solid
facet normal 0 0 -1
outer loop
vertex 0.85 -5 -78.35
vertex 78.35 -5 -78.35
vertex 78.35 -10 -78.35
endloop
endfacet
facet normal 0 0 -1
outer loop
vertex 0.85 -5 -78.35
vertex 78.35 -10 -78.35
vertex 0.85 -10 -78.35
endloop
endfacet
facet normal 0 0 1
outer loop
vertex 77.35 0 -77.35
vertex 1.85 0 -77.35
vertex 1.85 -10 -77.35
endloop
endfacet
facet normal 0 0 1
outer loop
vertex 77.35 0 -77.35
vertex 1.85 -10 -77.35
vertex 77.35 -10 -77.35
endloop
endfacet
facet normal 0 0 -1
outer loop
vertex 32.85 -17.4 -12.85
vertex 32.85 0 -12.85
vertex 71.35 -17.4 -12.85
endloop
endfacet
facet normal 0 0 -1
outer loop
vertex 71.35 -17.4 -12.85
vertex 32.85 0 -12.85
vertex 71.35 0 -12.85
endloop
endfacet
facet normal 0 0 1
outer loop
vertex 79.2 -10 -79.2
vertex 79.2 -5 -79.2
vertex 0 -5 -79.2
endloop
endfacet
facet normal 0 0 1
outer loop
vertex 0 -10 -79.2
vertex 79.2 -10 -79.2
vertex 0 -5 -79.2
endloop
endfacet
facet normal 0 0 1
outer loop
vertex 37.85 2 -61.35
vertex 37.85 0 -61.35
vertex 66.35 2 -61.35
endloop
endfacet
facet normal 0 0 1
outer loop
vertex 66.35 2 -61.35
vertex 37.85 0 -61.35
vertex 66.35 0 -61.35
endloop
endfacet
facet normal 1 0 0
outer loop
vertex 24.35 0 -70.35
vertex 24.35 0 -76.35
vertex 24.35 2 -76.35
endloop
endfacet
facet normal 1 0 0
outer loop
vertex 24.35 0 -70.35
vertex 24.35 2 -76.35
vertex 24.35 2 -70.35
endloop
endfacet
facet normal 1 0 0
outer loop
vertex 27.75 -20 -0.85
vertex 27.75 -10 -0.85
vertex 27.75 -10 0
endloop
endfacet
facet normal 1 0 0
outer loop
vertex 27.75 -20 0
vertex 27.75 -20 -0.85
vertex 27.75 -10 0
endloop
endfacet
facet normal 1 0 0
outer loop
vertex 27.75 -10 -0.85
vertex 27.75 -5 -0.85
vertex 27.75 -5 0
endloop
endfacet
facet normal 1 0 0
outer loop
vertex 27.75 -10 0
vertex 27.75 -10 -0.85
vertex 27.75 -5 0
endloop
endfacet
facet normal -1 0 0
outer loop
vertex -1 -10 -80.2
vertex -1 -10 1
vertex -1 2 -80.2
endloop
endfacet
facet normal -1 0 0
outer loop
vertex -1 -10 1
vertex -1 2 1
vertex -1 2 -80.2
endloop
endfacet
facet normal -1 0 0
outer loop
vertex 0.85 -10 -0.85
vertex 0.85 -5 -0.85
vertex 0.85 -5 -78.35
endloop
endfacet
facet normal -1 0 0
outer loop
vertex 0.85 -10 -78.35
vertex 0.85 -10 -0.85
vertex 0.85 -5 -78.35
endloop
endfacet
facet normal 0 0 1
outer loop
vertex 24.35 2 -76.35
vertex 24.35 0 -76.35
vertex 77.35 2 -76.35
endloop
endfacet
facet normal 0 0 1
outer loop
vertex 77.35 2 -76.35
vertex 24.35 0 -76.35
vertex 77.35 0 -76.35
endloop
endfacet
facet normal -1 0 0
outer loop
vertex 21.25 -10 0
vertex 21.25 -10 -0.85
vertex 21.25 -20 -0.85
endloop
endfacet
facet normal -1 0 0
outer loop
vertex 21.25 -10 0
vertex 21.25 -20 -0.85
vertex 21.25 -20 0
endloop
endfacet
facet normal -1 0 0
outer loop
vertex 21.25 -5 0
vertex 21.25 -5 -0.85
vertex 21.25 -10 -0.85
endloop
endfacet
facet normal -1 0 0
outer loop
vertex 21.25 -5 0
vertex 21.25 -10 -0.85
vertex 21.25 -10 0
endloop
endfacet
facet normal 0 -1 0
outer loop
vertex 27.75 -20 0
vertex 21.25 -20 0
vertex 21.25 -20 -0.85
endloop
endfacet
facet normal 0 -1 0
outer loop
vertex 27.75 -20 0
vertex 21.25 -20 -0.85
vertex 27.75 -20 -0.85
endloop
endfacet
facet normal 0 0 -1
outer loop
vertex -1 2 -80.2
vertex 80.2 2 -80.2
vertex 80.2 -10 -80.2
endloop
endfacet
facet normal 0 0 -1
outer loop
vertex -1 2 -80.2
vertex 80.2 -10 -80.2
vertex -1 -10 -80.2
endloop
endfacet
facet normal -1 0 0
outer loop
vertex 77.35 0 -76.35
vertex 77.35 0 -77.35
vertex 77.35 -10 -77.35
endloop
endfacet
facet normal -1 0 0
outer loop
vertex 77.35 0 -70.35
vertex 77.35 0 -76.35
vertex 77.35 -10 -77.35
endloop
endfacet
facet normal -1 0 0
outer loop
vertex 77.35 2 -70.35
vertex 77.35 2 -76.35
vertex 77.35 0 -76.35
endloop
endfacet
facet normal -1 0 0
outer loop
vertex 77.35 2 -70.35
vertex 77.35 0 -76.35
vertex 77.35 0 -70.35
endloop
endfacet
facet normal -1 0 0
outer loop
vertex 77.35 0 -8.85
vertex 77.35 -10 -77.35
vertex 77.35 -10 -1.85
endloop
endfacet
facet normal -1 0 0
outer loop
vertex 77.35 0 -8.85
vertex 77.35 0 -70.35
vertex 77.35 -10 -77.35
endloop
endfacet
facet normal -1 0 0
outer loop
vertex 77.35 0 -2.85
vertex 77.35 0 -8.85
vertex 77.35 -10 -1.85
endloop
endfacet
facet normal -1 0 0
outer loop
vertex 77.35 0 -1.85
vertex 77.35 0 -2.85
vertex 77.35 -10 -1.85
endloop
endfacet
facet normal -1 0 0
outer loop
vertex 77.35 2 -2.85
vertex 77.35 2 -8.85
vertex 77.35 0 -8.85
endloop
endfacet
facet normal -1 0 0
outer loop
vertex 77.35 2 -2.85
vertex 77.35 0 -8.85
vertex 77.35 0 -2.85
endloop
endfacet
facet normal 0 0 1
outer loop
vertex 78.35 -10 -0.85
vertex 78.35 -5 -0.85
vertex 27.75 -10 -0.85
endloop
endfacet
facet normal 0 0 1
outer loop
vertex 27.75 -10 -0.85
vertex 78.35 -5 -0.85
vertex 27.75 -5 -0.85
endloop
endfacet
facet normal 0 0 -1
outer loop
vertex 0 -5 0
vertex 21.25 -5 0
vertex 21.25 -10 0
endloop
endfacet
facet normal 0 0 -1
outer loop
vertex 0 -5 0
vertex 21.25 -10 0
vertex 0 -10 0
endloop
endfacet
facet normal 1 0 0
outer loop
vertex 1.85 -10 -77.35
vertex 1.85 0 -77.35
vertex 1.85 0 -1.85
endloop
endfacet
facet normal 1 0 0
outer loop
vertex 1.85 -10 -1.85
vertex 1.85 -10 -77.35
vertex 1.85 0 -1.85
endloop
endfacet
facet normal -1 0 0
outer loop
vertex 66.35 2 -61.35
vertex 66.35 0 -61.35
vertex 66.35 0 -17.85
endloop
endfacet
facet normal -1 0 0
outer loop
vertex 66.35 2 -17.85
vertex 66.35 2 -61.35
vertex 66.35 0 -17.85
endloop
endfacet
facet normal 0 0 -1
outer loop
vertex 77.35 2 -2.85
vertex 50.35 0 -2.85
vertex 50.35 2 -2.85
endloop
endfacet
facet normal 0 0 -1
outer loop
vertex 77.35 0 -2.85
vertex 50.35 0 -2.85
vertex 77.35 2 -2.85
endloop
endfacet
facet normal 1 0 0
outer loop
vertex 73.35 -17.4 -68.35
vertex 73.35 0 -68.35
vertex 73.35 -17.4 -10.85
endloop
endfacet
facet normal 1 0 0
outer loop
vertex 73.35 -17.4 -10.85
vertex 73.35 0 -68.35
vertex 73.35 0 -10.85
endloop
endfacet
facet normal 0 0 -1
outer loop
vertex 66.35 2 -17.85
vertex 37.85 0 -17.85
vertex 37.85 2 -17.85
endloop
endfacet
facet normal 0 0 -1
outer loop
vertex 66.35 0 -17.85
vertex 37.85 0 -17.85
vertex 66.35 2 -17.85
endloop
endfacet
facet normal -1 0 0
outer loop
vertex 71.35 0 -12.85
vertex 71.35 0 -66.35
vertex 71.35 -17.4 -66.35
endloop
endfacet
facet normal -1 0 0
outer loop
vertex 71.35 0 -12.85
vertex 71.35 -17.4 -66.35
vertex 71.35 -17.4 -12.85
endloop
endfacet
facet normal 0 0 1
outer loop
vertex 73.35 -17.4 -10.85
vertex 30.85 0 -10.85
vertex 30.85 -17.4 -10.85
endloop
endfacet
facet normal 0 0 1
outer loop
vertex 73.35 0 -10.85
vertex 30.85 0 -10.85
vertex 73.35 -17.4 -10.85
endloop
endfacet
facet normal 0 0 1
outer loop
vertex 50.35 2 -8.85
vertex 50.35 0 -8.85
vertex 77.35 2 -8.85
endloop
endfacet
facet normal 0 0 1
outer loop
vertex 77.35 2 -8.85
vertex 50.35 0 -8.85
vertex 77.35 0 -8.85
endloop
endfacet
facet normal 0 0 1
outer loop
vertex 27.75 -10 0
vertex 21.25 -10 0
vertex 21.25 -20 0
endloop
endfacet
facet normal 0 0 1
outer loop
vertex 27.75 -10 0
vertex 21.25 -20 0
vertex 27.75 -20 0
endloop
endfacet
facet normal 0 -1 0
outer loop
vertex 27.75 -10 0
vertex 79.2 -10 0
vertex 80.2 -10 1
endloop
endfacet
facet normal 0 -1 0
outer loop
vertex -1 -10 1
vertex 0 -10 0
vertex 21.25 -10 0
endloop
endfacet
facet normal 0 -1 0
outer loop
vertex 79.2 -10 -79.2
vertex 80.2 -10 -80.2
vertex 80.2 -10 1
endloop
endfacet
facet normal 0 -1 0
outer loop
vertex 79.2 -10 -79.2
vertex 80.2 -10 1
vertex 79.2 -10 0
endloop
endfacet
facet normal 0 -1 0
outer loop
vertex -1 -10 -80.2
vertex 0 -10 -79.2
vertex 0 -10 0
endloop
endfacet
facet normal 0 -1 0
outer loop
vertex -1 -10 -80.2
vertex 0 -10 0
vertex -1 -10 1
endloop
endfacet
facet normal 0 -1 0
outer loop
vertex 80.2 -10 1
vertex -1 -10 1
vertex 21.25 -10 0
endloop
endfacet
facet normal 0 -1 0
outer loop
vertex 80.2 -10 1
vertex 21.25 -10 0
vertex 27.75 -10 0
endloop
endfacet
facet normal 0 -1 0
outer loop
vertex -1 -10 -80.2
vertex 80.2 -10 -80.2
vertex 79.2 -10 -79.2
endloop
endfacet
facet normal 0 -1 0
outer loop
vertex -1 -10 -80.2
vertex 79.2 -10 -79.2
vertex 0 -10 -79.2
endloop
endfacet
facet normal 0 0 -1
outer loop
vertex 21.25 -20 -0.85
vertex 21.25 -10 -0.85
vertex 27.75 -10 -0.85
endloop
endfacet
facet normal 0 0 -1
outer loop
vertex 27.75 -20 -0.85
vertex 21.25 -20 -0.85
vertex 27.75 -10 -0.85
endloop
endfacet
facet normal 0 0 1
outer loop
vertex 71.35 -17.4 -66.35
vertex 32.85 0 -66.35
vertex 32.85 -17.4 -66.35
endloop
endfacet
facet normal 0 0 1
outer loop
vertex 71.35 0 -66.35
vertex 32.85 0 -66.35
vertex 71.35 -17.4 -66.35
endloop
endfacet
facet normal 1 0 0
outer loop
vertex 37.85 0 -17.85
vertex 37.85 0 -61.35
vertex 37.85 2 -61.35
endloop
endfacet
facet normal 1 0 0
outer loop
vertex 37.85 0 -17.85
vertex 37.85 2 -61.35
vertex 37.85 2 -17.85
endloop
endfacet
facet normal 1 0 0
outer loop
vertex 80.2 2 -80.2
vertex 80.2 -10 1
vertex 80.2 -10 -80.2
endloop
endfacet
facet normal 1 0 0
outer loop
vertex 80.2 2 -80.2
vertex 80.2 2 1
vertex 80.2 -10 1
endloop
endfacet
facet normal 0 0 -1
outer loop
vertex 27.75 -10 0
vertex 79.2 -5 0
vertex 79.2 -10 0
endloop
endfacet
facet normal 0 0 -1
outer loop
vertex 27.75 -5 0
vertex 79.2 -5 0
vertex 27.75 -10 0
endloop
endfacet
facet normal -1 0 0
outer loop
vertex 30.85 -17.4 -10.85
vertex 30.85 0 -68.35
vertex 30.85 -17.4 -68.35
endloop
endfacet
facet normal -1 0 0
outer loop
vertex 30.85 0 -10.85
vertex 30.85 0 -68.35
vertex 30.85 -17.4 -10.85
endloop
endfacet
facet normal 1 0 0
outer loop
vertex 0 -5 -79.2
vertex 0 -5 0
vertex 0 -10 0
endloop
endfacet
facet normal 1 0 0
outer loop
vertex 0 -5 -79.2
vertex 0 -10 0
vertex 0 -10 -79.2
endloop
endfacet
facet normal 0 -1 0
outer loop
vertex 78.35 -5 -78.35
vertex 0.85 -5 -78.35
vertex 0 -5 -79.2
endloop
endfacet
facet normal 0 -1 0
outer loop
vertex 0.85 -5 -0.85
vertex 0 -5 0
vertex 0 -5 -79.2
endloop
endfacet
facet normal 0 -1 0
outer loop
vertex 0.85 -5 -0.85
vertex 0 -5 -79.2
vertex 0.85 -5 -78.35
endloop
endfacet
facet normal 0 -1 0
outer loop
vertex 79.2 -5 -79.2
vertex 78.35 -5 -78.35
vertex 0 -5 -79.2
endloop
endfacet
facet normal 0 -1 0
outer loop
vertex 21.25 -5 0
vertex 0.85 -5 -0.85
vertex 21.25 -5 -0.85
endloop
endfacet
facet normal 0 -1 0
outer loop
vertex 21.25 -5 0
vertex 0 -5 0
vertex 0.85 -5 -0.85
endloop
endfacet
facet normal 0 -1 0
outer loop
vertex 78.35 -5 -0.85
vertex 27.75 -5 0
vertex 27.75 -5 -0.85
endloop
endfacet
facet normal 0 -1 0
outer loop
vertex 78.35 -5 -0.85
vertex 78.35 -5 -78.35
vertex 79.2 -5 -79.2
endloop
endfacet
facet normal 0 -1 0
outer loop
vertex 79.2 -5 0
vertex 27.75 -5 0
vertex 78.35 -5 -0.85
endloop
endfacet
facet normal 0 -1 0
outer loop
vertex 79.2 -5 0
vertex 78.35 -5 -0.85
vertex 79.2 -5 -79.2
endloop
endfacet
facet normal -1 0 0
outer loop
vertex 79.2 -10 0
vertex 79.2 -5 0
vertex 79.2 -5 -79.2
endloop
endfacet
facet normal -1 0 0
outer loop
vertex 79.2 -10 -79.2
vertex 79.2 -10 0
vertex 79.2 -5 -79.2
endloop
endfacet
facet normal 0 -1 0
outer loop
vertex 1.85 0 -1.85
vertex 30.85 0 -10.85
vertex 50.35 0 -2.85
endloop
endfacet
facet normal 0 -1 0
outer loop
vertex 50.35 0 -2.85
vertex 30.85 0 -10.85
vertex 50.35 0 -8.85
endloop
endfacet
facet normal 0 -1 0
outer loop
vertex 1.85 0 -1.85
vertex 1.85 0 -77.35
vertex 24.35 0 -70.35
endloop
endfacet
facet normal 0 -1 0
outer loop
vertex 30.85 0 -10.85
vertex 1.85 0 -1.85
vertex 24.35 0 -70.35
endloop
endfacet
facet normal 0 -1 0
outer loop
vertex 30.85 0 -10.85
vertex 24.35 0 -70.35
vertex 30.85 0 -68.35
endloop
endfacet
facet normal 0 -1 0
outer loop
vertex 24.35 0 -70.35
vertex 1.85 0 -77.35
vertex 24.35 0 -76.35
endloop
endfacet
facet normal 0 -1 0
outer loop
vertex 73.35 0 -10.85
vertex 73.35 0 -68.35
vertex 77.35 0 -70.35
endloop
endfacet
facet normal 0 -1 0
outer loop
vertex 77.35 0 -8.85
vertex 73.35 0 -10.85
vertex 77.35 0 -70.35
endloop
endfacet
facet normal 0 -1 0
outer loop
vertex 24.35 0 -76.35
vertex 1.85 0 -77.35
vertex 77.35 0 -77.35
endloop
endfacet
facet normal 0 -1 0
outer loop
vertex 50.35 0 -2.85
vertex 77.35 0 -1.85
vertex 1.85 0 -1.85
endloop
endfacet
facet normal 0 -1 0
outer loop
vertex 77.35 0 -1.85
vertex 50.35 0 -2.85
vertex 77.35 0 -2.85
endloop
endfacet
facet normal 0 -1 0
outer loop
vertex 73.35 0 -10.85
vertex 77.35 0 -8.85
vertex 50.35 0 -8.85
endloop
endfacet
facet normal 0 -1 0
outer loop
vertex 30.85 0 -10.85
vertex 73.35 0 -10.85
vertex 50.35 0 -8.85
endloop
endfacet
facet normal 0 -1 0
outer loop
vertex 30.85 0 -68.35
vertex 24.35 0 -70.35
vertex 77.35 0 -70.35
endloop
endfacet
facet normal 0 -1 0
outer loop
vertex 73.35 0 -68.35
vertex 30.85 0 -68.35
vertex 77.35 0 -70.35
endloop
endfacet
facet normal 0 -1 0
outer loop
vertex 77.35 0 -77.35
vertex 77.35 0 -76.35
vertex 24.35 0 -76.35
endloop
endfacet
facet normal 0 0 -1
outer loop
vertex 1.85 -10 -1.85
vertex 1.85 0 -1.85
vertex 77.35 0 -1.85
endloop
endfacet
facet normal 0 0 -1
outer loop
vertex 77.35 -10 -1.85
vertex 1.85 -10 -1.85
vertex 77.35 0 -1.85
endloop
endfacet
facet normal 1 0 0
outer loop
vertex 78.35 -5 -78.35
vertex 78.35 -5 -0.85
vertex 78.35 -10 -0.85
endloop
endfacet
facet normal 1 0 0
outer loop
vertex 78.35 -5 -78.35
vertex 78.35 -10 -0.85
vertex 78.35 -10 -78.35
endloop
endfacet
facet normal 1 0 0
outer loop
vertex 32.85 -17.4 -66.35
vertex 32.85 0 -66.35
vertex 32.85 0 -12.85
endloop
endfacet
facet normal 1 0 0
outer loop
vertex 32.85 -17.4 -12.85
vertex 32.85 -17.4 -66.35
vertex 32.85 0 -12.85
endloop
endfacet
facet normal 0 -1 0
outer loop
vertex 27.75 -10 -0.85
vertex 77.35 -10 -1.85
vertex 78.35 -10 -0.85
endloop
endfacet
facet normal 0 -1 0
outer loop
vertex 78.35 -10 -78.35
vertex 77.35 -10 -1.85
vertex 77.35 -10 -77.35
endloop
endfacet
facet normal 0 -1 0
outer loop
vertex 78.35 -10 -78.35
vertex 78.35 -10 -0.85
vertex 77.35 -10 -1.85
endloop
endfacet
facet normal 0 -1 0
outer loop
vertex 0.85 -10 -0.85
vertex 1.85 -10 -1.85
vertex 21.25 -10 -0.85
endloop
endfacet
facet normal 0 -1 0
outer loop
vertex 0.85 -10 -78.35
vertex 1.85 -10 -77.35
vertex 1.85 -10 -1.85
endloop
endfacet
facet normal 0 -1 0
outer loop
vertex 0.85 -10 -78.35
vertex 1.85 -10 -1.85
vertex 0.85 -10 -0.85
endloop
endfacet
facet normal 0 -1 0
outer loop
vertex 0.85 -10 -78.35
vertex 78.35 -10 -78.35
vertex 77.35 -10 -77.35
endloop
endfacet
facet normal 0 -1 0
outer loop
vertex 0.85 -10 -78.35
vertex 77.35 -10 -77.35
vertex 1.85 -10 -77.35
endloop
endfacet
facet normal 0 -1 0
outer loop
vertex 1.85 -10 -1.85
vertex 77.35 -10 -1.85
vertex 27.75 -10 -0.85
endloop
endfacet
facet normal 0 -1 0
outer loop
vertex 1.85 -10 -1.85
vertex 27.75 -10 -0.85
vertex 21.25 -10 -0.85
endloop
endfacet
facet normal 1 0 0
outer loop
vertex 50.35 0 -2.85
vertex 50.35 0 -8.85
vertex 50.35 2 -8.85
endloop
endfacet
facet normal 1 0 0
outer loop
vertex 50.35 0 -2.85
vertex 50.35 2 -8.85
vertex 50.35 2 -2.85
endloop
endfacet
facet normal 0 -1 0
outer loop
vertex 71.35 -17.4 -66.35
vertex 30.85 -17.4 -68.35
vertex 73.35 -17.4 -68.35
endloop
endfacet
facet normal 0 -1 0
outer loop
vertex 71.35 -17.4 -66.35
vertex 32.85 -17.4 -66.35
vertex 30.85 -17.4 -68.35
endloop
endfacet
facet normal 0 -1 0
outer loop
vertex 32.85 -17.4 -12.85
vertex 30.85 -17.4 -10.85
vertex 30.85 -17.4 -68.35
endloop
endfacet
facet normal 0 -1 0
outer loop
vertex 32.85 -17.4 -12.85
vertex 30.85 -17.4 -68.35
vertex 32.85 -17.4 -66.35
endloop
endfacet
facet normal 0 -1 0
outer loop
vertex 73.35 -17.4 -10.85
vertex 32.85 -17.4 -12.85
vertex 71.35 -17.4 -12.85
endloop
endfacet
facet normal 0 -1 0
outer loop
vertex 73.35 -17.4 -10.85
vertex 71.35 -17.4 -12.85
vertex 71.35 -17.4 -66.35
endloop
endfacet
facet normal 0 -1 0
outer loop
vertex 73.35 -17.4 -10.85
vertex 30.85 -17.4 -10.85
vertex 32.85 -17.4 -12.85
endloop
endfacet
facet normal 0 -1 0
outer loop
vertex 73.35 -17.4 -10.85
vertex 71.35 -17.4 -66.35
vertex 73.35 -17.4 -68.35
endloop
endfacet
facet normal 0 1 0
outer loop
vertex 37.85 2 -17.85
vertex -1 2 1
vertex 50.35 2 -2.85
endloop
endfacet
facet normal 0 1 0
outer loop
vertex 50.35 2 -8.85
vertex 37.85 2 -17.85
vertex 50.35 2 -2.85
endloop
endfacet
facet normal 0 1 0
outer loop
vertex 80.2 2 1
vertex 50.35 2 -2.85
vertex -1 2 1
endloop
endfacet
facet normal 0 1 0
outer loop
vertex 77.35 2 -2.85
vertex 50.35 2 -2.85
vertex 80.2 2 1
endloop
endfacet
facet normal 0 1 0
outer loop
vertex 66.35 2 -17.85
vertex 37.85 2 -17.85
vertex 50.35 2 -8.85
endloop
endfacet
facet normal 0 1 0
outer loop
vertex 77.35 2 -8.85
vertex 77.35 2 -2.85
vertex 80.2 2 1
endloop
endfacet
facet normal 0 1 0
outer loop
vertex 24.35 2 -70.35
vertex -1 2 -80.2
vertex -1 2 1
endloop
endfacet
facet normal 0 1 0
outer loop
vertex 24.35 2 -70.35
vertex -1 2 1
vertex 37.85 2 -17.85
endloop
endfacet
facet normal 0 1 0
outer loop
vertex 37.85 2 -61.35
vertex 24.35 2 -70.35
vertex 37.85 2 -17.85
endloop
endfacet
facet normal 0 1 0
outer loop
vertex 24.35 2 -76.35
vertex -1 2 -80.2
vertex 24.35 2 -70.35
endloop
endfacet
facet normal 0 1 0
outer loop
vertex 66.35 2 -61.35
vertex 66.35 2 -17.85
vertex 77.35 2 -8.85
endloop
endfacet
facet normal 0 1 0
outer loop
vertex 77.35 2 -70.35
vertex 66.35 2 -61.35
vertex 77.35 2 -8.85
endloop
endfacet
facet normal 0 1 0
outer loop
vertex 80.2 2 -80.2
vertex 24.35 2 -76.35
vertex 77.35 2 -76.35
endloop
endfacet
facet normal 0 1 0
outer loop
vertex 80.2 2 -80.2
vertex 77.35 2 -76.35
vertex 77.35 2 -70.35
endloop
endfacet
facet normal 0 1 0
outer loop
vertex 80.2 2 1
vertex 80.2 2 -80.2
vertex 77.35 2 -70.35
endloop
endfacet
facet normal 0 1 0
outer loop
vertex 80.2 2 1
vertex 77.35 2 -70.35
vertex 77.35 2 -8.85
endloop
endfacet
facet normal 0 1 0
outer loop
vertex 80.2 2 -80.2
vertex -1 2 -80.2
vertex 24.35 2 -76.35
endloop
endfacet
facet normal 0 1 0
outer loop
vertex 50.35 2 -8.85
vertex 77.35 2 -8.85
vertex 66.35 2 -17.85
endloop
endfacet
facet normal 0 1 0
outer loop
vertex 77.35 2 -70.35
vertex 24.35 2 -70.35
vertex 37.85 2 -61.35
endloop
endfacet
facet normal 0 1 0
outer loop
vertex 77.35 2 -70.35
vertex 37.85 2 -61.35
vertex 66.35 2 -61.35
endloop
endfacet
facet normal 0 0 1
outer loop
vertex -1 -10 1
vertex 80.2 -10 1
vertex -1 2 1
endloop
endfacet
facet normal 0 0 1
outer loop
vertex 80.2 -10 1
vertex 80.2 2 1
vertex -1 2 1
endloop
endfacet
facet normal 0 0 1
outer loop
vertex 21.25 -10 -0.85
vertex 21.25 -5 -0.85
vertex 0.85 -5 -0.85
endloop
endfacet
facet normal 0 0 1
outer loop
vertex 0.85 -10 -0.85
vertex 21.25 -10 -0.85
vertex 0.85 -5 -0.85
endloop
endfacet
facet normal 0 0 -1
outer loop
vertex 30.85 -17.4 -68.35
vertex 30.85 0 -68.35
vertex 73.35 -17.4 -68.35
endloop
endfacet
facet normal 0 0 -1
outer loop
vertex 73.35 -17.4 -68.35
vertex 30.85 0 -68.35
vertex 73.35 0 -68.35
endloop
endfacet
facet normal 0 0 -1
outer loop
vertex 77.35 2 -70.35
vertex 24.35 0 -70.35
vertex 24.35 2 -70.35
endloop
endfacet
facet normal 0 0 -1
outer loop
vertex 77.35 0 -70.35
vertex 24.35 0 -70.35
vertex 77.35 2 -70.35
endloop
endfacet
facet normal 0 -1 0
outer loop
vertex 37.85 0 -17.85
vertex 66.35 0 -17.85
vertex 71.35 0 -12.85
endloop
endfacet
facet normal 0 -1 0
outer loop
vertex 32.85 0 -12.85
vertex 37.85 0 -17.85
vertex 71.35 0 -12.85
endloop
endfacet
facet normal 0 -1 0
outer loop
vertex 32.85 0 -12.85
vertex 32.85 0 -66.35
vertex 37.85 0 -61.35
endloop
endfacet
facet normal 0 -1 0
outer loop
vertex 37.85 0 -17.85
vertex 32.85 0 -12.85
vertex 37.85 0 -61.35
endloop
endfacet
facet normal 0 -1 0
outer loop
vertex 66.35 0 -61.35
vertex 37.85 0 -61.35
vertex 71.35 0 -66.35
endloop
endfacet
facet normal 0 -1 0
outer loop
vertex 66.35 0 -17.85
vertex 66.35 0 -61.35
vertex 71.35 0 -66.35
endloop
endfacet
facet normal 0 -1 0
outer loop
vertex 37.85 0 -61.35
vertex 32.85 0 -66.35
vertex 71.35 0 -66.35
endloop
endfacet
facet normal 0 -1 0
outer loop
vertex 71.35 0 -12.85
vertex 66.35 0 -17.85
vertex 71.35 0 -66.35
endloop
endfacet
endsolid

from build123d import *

# Parameters (mm, degrees)
SKETCH5_W                 = 81.2
SKETCH5_H                 = 81.2
BOSS_EXTRUDE3_DEPTH       = 2
SKETCH9_W                 = 81.2
SKETCH9_H                 = 81.2
SKETCH9_W_2               = 75.5
SKETCH9_H_2               = 75.5
BOSS_EXTRUDE5_DEPTH       = 5
SKETCH6_W                 = 42.5
SKETCH6_H                 = 57.5
SKETCH6_W_2               = 38.5
SKETCH6_H_2               = 53.5
BOSS_EXTRUDE4_DEPTH       = 17.4
SKETCH7_W                 = 28.5
SKETCH7_H                 = 43.5
SKETCH7_W_2               = 27
SKETCH7_H_2               = 6
SKETCH7_W_3               = 53
CUT_EXTRUDE1_DEPTH        = 2
SKETCH10_W                = 6.5
SKETCH10_H                = 0.85
BOSS_EXTRUDE6_DEPTH       = 15
BOSS_EXTRUDE7_OUTLINE_W   = 81.2
BOSS_EXTRUDE7_OUTLINE_H   = 81.2
BOSS_EXTRUDE7_OUTLINE_W_2 = 79.2
BOSS_EXTRUDE7_OUTLINE_H_2 = 79.2
BOSS_EXTRUDE7_OUTLINE_W_3 = 77.5
BOSS_EXTRUDE7_OUTLINE_H_3 = 77.5
BOSS_EXTRUDE7_OUTLINE_W_4 = 75.5
BOSS_EXTRUDE7_OUTLINE_H_4 = 75.5
BOSS_EXTRUDE7_DEPTH       = 5


# Read off the part's stored shape, not the designer's step: Boss-Extrude7
with BuildPart() as part:
    # Sketch5 → Boss-Extrude3 (new body)
    with BuildSketch(Plane(origin=(0, 0, 0), x_dir=(1, 0, 0), z_dir=(0, 1, 0))):
        with Locations((39.6, 39.6)):
            Rectangle(SKETCH5_W, SKETCH5_H)
    extrude(amount=BOSS_EXTRUDE3_DEPTH)

    # Sketch9 → Boss-Extrude5 (add)
    with BuildSketch(Plane.XZ):
        with Locations((39.6, -39.6)):
            Rectangle(SKETCH9_W, SKETCH9_H)
        with Locations((39.6, -39.6)):
            Rectangle(SKETCH9_W_2, SKETCH9_H_2, mode=Mode.SUBTRACT)
    extrude(amount=BOSS_EXTRUDE5_DEPTH)

    # Sketch6 → Boss-Extrude4 (add)
    with BuildSketch(Plane.XZ):
        with Locations((52.1, -39.6)):
            Rectangle(SKETCH6_W, SKETCH6_H)
        with Locations((52.1, -39.6)):
            Rectangle(SKETCH6_W_2, SKETCH6_H_2, mode=Mode.SUBTRACT)
    extrude(amount=BOSS_EXTRUDE4_DEPTH)

    # Sketch7 → Cut-Extrude1 (cut)
    with BuildSketch(Plane.XZ):
        with Locations((52.1, -39.6)):
            Rectangle(SKETCH7_W, SKETCH7_H)
        with Locations((63.85, -5.85)):
            Rectangle(SKETCH7_W_2, SKETCH7_H_2)
        with Locations((50.85, -73.35)):
            Rectangle(SKETCH7_W_3, SKETCH7_H_2)
    extrude(amount=-CUT_EXTRUDE1_DEPTH, mode=Mode.SUBTRACT)

    # Sketch10 → Boss-Extrude6 (add)
    with BuildSketch(Plane.XZ.offset(5)):
        with Locations((24.5, -0.425)):
            Rectangle(SKETCH10_W, SKETCH10_H)
    extrude(amount=BOSS_EXTRUDE6_DEPTH)

    # Boss-Extrude7 outline → Boss-Extrude7 (add)
    # profile 1 of 2: a face of its own
    with BuildSketch(Plane(origin=(0, -5, 0), x_dir=(-1, 0, 0), z_dir=(0, -1, 0))):
        with Locations((-39.6, 39.6)):
            Rectangle(BOSS_EXTRUDE7_OUTLINE_W, BOSS_EXTRUDE7_OUTLINE_H)
        with Locations((-39.6, 39.6)):
            Rectangle(BOSS_EXTRUDE7_OUTLINE_W_2, BOSS_EXTRUDE7_OUTLINE_H_2, mode=Mode.SUBTRACT)
    # profile 2 of 2: a face of its own
    with BuildSketch(Plane(origin=(0, -5, 0), x_dir=(-1, 0, 0), z_dir=(0, -1, 0))):
        with Locations((-39.6, 39.6)):
            Rectangle(BOSS_EXTRUDE7_OUTLINE_W_3, BOSS_EXTRUDE7_OUTLINE_H_3)
        with Locations((-39.6, 39.6)):
            Rectangle(BOSS_EXTRUDE7_OUTLINE_W_4, BOSS_EXTRUDE7_OUTLINE_H_4, mode=Mode.SUBTRACT)
    extrude(amount=BOSS_EXTRUDE7_DEPTH)


solid = part.part
